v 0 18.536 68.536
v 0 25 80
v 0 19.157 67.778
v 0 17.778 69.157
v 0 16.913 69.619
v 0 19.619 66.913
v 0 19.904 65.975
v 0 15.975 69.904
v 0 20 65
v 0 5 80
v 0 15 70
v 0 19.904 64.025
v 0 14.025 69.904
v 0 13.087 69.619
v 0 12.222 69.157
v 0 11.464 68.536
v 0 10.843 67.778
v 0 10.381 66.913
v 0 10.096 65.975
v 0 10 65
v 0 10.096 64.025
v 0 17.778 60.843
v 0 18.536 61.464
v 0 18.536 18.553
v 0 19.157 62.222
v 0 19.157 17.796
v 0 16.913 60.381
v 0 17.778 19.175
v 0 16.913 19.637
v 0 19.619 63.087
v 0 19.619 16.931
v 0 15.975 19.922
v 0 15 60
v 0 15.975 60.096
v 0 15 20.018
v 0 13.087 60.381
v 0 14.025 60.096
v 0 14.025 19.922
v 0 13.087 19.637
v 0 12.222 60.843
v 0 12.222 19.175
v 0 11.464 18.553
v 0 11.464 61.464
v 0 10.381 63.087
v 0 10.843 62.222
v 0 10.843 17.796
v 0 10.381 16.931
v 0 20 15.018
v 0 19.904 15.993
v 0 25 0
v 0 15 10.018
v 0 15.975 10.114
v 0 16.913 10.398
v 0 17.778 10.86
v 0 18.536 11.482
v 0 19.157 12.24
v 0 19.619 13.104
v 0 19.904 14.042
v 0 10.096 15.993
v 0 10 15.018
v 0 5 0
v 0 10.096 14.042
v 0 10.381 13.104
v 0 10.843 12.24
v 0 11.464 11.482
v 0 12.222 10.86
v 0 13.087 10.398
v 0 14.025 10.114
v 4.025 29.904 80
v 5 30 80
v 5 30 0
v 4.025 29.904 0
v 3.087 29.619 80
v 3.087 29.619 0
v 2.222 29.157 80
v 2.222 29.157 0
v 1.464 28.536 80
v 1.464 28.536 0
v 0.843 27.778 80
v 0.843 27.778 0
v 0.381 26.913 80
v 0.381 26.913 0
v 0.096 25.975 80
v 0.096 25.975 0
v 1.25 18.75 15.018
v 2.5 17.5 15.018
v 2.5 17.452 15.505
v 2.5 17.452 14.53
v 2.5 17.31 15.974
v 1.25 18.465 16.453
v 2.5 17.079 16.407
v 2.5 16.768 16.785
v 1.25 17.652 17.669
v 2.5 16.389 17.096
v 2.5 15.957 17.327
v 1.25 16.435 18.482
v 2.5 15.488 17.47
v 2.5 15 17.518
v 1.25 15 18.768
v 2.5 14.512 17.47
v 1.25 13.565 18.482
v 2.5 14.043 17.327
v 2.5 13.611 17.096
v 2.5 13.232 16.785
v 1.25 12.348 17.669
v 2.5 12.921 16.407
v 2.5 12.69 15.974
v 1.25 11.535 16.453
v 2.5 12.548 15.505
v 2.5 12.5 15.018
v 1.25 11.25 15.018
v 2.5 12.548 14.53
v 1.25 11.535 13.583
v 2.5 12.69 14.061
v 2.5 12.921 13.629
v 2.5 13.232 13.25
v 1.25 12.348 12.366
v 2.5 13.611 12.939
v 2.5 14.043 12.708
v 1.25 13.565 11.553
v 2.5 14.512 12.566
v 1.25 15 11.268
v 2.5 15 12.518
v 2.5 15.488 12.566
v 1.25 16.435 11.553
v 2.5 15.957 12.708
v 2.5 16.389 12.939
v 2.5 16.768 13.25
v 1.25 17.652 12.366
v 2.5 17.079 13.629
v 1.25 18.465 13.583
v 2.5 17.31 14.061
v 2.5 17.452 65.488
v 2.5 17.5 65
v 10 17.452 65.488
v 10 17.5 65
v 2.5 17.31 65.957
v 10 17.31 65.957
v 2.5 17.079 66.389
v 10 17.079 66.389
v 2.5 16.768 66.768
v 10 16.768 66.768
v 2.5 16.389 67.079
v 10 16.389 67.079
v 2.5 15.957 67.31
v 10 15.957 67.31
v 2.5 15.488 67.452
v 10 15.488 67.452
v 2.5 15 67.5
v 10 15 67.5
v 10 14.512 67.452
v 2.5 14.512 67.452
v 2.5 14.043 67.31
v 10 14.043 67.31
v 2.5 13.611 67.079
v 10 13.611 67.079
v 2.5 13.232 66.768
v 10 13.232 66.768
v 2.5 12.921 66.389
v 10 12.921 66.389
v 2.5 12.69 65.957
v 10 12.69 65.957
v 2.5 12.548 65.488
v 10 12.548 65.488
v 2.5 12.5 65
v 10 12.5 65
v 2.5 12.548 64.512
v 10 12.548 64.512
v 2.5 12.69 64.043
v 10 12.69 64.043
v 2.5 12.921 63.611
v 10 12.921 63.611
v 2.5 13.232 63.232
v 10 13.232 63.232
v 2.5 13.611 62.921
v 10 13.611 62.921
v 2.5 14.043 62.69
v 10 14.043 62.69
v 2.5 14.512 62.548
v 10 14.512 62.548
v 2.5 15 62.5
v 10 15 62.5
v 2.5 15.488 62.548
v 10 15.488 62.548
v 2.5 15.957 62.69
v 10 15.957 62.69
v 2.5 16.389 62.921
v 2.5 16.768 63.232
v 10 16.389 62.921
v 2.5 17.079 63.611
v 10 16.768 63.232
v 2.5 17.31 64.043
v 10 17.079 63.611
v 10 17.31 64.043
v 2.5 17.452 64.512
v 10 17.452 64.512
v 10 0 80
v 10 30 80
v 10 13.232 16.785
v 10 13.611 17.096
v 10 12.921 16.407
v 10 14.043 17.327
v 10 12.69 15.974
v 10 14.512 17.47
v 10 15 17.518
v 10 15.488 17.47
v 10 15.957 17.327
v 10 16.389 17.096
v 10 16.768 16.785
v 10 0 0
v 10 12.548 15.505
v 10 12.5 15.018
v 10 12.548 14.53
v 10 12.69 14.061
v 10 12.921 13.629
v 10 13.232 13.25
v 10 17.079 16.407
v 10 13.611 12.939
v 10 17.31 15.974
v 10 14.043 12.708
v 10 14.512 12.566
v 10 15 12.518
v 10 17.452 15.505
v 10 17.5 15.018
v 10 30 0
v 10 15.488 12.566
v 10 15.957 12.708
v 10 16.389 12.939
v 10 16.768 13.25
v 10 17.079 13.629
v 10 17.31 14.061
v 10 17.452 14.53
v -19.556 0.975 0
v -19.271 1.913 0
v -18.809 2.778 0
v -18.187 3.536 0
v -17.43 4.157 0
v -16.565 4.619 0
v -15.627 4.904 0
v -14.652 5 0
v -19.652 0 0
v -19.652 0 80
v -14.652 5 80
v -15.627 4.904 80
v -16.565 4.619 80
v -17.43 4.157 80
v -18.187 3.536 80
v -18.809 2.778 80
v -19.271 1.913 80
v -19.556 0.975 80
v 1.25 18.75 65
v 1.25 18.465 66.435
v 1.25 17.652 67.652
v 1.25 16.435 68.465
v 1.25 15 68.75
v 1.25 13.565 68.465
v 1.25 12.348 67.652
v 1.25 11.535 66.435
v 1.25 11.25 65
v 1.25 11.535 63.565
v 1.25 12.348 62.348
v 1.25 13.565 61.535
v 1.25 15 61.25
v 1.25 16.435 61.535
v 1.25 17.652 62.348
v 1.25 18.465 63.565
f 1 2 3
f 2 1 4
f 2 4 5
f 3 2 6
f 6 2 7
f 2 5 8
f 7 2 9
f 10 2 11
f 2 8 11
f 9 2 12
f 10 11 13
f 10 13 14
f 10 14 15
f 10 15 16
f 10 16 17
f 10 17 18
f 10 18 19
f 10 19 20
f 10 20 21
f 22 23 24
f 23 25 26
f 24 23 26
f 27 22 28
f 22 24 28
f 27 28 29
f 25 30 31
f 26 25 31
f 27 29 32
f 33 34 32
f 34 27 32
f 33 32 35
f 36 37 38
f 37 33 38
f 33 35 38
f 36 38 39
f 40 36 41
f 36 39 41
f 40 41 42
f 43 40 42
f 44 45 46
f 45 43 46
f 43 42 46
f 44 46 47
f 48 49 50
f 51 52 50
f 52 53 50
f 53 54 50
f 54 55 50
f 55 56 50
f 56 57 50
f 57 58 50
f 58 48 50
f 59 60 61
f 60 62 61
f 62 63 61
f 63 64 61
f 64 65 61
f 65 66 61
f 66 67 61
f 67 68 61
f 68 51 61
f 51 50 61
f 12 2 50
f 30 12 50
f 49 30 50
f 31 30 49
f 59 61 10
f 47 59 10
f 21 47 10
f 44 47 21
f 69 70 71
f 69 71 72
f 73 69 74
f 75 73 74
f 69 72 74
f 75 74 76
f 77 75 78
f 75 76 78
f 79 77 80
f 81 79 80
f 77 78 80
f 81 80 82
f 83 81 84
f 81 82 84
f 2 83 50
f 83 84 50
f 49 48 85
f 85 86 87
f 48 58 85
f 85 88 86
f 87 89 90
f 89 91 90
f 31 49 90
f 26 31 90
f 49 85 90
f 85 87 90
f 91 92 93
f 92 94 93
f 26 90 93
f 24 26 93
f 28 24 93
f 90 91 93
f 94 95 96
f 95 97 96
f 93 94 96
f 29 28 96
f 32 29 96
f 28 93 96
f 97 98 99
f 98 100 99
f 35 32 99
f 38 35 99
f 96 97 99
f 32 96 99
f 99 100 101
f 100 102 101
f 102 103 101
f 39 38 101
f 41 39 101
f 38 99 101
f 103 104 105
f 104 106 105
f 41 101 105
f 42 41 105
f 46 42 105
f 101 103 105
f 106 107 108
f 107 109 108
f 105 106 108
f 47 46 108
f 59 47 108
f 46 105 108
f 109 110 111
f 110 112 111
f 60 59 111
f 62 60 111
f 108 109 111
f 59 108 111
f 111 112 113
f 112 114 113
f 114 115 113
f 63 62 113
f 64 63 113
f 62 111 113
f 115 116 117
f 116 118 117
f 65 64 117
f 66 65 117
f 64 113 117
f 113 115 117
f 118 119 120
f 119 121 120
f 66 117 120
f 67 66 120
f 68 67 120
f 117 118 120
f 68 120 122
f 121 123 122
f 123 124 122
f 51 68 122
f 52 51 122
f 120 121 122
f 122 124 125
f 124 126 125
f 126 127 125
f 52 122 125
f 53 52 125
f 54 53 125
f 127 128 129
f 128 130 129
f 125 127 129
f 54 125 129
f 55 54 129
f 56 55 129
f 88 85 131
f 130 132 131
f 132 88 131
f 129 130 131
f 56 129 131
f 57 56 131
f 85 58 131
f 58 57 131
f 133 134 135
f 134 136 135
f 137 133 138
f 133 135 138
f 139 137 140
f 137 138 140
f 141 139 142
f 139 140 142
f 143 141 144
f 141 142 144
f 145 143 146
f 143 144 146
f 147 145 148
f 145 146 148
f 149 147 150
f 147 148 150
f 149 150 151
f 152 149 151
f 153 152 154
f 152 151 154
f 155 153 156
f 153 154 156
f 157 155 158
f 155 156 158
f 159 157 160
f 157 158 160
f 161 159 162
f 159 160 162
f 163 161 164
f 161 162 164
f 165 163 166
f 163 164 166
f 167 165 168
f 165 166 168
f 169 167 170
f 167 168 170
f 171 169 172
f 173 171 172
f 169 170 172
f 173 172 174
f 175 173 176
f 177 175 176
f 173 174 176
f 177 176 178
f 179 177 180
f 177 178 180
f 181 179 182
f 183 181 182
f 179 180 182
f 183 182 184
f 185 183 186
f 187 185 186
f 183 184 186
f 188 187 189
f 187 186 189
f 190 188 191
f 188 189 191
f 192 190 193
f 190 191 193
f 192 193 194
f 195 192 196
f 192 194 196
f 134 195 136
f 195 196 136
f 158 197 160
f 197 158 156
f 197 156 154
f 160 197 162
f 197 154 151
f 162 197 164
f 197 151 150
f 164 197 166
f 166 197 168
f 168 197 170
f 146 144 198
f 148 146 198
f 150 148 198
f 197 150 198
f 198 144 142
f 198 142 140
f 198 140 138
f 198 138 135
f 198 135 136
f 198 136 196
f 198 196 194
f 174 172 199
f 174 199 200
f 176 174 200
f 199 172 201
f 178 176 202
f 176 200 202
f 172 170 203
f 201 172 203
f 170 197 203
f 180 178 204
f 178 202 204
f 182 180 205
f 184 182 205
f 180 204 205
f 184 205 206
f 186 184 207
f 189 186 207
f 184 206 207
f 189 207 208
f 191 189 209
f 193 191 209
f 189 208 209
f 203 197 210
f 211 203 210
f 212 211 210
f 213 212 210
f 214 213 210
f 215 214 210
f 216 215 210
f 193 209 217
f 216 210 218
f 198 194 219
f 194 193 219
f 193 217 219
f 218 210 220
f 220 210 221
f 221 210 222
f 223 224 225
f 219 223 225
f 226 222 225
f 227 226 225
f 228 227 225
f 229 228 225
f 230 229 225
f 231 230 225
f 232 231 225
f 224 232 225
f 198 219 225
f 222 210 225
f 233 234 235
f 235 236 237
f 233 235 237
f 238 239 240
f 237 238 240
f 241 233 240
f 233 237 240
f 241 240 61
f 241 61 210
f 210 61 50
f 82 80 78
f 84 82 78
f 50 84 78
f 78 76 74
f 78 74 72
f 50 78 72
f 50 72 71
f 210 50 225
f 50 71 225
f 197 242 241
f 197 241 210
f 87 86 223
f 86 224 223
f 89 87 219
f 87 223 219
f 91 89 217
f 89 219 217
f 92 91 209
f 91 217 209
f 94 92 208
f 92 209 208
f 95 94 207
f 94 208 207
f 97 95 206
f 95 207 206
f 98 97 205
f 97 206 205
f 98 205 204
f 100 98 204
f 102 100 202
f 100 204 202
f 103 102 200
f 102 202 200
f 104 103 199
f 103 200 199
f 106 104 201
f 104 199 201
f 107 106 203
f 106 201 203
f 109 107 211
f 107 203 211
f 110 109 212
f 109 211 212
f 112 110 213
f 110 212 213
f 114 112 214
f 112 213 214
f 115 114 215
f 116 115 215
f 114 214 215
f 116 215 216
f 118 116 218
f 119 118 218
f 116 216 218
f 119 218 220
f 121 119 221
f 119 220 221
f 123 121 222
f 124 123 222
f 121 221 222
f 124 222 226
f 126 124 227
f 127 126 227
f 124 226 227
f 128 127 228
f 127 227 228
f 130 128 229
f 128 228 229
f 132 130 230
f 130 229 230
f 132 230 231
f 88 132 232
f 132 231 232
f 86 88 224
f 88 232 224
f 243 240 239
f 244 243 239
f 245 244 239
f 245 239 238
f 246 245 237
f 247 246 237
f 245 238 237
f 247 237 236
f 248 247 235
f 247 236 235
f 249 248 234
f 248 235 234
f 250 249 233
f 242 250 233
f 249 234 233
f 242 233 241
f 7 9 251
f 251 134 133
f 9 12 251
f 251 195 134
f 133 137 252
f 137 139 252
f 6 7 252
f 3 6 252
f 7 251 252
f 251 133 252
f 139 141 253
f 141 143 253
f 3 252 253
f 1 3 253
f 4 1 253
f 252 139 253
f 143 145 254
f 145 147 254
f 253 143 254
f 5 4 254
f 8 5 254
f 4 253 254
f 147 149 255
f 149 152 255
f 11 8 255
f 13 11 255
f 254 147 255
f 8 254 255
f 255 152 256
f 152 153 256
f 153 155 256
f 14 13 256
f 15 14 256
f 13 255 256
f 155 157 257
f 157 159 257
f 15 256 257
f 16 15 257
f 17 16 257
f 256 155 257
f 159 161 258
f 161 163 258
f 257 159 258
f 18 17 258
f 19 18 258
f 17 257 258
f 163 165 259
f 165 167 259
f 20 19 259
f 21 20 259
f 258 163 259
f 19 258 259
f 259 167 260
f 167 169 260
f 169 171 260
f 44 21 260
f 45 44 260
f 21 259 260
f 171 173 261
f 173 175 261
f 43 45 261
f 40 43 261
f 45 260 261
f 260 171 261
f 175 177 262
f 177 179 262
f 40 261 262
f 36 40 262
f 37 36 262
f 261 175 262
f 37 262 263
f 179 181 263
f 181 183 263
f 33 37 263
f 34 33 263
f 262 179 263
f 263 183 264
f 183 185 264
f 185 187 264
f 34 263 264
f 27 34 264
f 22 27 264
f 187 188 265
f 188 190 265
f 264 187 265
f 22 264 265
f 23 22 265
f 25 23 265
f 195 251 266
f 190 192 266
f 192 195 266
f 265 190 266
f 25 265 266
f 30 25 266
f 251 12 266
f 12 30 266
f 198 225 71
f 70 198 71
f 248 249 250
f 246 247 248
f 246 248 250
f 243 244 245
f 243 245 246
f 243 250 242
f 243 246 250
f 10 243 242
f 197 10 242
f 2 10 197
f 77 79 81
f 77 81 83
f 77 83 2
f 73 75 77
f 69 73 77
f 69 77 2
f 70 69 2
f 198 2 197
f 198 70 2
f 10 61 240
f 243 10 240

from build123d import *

# Parameters (mm, degrees)
F1_DEPTH       = 80
F3_D           = 5
F3_CSINK_D     = 10
F3_CSINK_ANGLE = 90


with BuildPart() as f1:
    # F0 (on Top) → F1 (new body)
    with BuildSketch(Plane.XY):
        with BuildLine():
            Line((10, 0), (10, 30))
            Line((10, 30), (5, 30))
            ThreePointArc((5, 30), (1.464466, 28.535534), (0, 25))
            Line((0, 25), (0, 5))
            Line((0, 5), (0, 0))
            Line((0, 0), (10, 0))
        make_face()
        with BuildLine():
            Line((-19.651743, 0), (0, 0))
            Line((0, 0), (0, 5))
            Line((0, 5), (-14.651743, 5))
            ThreePointArc((-14.651743, 5), (-18.187277, 3.535534), (-19.651743, 0))
        make_face()
    extrude(amount=F1_DEPTH)

    # F3 (through all)
    with Locations(Plane(origin=(0, 0, 0), x_dir=(0, -1, 0), z_dir=(-1, 0, 0))):
        with Locations((-15, 15.017683), (-15, 65)):
            CounterSinkHole(F3_D / 2, F3_CSINK_D / 2, counter_sink_angle=F3_CSINK_ANGLE)


solid = f1.part
